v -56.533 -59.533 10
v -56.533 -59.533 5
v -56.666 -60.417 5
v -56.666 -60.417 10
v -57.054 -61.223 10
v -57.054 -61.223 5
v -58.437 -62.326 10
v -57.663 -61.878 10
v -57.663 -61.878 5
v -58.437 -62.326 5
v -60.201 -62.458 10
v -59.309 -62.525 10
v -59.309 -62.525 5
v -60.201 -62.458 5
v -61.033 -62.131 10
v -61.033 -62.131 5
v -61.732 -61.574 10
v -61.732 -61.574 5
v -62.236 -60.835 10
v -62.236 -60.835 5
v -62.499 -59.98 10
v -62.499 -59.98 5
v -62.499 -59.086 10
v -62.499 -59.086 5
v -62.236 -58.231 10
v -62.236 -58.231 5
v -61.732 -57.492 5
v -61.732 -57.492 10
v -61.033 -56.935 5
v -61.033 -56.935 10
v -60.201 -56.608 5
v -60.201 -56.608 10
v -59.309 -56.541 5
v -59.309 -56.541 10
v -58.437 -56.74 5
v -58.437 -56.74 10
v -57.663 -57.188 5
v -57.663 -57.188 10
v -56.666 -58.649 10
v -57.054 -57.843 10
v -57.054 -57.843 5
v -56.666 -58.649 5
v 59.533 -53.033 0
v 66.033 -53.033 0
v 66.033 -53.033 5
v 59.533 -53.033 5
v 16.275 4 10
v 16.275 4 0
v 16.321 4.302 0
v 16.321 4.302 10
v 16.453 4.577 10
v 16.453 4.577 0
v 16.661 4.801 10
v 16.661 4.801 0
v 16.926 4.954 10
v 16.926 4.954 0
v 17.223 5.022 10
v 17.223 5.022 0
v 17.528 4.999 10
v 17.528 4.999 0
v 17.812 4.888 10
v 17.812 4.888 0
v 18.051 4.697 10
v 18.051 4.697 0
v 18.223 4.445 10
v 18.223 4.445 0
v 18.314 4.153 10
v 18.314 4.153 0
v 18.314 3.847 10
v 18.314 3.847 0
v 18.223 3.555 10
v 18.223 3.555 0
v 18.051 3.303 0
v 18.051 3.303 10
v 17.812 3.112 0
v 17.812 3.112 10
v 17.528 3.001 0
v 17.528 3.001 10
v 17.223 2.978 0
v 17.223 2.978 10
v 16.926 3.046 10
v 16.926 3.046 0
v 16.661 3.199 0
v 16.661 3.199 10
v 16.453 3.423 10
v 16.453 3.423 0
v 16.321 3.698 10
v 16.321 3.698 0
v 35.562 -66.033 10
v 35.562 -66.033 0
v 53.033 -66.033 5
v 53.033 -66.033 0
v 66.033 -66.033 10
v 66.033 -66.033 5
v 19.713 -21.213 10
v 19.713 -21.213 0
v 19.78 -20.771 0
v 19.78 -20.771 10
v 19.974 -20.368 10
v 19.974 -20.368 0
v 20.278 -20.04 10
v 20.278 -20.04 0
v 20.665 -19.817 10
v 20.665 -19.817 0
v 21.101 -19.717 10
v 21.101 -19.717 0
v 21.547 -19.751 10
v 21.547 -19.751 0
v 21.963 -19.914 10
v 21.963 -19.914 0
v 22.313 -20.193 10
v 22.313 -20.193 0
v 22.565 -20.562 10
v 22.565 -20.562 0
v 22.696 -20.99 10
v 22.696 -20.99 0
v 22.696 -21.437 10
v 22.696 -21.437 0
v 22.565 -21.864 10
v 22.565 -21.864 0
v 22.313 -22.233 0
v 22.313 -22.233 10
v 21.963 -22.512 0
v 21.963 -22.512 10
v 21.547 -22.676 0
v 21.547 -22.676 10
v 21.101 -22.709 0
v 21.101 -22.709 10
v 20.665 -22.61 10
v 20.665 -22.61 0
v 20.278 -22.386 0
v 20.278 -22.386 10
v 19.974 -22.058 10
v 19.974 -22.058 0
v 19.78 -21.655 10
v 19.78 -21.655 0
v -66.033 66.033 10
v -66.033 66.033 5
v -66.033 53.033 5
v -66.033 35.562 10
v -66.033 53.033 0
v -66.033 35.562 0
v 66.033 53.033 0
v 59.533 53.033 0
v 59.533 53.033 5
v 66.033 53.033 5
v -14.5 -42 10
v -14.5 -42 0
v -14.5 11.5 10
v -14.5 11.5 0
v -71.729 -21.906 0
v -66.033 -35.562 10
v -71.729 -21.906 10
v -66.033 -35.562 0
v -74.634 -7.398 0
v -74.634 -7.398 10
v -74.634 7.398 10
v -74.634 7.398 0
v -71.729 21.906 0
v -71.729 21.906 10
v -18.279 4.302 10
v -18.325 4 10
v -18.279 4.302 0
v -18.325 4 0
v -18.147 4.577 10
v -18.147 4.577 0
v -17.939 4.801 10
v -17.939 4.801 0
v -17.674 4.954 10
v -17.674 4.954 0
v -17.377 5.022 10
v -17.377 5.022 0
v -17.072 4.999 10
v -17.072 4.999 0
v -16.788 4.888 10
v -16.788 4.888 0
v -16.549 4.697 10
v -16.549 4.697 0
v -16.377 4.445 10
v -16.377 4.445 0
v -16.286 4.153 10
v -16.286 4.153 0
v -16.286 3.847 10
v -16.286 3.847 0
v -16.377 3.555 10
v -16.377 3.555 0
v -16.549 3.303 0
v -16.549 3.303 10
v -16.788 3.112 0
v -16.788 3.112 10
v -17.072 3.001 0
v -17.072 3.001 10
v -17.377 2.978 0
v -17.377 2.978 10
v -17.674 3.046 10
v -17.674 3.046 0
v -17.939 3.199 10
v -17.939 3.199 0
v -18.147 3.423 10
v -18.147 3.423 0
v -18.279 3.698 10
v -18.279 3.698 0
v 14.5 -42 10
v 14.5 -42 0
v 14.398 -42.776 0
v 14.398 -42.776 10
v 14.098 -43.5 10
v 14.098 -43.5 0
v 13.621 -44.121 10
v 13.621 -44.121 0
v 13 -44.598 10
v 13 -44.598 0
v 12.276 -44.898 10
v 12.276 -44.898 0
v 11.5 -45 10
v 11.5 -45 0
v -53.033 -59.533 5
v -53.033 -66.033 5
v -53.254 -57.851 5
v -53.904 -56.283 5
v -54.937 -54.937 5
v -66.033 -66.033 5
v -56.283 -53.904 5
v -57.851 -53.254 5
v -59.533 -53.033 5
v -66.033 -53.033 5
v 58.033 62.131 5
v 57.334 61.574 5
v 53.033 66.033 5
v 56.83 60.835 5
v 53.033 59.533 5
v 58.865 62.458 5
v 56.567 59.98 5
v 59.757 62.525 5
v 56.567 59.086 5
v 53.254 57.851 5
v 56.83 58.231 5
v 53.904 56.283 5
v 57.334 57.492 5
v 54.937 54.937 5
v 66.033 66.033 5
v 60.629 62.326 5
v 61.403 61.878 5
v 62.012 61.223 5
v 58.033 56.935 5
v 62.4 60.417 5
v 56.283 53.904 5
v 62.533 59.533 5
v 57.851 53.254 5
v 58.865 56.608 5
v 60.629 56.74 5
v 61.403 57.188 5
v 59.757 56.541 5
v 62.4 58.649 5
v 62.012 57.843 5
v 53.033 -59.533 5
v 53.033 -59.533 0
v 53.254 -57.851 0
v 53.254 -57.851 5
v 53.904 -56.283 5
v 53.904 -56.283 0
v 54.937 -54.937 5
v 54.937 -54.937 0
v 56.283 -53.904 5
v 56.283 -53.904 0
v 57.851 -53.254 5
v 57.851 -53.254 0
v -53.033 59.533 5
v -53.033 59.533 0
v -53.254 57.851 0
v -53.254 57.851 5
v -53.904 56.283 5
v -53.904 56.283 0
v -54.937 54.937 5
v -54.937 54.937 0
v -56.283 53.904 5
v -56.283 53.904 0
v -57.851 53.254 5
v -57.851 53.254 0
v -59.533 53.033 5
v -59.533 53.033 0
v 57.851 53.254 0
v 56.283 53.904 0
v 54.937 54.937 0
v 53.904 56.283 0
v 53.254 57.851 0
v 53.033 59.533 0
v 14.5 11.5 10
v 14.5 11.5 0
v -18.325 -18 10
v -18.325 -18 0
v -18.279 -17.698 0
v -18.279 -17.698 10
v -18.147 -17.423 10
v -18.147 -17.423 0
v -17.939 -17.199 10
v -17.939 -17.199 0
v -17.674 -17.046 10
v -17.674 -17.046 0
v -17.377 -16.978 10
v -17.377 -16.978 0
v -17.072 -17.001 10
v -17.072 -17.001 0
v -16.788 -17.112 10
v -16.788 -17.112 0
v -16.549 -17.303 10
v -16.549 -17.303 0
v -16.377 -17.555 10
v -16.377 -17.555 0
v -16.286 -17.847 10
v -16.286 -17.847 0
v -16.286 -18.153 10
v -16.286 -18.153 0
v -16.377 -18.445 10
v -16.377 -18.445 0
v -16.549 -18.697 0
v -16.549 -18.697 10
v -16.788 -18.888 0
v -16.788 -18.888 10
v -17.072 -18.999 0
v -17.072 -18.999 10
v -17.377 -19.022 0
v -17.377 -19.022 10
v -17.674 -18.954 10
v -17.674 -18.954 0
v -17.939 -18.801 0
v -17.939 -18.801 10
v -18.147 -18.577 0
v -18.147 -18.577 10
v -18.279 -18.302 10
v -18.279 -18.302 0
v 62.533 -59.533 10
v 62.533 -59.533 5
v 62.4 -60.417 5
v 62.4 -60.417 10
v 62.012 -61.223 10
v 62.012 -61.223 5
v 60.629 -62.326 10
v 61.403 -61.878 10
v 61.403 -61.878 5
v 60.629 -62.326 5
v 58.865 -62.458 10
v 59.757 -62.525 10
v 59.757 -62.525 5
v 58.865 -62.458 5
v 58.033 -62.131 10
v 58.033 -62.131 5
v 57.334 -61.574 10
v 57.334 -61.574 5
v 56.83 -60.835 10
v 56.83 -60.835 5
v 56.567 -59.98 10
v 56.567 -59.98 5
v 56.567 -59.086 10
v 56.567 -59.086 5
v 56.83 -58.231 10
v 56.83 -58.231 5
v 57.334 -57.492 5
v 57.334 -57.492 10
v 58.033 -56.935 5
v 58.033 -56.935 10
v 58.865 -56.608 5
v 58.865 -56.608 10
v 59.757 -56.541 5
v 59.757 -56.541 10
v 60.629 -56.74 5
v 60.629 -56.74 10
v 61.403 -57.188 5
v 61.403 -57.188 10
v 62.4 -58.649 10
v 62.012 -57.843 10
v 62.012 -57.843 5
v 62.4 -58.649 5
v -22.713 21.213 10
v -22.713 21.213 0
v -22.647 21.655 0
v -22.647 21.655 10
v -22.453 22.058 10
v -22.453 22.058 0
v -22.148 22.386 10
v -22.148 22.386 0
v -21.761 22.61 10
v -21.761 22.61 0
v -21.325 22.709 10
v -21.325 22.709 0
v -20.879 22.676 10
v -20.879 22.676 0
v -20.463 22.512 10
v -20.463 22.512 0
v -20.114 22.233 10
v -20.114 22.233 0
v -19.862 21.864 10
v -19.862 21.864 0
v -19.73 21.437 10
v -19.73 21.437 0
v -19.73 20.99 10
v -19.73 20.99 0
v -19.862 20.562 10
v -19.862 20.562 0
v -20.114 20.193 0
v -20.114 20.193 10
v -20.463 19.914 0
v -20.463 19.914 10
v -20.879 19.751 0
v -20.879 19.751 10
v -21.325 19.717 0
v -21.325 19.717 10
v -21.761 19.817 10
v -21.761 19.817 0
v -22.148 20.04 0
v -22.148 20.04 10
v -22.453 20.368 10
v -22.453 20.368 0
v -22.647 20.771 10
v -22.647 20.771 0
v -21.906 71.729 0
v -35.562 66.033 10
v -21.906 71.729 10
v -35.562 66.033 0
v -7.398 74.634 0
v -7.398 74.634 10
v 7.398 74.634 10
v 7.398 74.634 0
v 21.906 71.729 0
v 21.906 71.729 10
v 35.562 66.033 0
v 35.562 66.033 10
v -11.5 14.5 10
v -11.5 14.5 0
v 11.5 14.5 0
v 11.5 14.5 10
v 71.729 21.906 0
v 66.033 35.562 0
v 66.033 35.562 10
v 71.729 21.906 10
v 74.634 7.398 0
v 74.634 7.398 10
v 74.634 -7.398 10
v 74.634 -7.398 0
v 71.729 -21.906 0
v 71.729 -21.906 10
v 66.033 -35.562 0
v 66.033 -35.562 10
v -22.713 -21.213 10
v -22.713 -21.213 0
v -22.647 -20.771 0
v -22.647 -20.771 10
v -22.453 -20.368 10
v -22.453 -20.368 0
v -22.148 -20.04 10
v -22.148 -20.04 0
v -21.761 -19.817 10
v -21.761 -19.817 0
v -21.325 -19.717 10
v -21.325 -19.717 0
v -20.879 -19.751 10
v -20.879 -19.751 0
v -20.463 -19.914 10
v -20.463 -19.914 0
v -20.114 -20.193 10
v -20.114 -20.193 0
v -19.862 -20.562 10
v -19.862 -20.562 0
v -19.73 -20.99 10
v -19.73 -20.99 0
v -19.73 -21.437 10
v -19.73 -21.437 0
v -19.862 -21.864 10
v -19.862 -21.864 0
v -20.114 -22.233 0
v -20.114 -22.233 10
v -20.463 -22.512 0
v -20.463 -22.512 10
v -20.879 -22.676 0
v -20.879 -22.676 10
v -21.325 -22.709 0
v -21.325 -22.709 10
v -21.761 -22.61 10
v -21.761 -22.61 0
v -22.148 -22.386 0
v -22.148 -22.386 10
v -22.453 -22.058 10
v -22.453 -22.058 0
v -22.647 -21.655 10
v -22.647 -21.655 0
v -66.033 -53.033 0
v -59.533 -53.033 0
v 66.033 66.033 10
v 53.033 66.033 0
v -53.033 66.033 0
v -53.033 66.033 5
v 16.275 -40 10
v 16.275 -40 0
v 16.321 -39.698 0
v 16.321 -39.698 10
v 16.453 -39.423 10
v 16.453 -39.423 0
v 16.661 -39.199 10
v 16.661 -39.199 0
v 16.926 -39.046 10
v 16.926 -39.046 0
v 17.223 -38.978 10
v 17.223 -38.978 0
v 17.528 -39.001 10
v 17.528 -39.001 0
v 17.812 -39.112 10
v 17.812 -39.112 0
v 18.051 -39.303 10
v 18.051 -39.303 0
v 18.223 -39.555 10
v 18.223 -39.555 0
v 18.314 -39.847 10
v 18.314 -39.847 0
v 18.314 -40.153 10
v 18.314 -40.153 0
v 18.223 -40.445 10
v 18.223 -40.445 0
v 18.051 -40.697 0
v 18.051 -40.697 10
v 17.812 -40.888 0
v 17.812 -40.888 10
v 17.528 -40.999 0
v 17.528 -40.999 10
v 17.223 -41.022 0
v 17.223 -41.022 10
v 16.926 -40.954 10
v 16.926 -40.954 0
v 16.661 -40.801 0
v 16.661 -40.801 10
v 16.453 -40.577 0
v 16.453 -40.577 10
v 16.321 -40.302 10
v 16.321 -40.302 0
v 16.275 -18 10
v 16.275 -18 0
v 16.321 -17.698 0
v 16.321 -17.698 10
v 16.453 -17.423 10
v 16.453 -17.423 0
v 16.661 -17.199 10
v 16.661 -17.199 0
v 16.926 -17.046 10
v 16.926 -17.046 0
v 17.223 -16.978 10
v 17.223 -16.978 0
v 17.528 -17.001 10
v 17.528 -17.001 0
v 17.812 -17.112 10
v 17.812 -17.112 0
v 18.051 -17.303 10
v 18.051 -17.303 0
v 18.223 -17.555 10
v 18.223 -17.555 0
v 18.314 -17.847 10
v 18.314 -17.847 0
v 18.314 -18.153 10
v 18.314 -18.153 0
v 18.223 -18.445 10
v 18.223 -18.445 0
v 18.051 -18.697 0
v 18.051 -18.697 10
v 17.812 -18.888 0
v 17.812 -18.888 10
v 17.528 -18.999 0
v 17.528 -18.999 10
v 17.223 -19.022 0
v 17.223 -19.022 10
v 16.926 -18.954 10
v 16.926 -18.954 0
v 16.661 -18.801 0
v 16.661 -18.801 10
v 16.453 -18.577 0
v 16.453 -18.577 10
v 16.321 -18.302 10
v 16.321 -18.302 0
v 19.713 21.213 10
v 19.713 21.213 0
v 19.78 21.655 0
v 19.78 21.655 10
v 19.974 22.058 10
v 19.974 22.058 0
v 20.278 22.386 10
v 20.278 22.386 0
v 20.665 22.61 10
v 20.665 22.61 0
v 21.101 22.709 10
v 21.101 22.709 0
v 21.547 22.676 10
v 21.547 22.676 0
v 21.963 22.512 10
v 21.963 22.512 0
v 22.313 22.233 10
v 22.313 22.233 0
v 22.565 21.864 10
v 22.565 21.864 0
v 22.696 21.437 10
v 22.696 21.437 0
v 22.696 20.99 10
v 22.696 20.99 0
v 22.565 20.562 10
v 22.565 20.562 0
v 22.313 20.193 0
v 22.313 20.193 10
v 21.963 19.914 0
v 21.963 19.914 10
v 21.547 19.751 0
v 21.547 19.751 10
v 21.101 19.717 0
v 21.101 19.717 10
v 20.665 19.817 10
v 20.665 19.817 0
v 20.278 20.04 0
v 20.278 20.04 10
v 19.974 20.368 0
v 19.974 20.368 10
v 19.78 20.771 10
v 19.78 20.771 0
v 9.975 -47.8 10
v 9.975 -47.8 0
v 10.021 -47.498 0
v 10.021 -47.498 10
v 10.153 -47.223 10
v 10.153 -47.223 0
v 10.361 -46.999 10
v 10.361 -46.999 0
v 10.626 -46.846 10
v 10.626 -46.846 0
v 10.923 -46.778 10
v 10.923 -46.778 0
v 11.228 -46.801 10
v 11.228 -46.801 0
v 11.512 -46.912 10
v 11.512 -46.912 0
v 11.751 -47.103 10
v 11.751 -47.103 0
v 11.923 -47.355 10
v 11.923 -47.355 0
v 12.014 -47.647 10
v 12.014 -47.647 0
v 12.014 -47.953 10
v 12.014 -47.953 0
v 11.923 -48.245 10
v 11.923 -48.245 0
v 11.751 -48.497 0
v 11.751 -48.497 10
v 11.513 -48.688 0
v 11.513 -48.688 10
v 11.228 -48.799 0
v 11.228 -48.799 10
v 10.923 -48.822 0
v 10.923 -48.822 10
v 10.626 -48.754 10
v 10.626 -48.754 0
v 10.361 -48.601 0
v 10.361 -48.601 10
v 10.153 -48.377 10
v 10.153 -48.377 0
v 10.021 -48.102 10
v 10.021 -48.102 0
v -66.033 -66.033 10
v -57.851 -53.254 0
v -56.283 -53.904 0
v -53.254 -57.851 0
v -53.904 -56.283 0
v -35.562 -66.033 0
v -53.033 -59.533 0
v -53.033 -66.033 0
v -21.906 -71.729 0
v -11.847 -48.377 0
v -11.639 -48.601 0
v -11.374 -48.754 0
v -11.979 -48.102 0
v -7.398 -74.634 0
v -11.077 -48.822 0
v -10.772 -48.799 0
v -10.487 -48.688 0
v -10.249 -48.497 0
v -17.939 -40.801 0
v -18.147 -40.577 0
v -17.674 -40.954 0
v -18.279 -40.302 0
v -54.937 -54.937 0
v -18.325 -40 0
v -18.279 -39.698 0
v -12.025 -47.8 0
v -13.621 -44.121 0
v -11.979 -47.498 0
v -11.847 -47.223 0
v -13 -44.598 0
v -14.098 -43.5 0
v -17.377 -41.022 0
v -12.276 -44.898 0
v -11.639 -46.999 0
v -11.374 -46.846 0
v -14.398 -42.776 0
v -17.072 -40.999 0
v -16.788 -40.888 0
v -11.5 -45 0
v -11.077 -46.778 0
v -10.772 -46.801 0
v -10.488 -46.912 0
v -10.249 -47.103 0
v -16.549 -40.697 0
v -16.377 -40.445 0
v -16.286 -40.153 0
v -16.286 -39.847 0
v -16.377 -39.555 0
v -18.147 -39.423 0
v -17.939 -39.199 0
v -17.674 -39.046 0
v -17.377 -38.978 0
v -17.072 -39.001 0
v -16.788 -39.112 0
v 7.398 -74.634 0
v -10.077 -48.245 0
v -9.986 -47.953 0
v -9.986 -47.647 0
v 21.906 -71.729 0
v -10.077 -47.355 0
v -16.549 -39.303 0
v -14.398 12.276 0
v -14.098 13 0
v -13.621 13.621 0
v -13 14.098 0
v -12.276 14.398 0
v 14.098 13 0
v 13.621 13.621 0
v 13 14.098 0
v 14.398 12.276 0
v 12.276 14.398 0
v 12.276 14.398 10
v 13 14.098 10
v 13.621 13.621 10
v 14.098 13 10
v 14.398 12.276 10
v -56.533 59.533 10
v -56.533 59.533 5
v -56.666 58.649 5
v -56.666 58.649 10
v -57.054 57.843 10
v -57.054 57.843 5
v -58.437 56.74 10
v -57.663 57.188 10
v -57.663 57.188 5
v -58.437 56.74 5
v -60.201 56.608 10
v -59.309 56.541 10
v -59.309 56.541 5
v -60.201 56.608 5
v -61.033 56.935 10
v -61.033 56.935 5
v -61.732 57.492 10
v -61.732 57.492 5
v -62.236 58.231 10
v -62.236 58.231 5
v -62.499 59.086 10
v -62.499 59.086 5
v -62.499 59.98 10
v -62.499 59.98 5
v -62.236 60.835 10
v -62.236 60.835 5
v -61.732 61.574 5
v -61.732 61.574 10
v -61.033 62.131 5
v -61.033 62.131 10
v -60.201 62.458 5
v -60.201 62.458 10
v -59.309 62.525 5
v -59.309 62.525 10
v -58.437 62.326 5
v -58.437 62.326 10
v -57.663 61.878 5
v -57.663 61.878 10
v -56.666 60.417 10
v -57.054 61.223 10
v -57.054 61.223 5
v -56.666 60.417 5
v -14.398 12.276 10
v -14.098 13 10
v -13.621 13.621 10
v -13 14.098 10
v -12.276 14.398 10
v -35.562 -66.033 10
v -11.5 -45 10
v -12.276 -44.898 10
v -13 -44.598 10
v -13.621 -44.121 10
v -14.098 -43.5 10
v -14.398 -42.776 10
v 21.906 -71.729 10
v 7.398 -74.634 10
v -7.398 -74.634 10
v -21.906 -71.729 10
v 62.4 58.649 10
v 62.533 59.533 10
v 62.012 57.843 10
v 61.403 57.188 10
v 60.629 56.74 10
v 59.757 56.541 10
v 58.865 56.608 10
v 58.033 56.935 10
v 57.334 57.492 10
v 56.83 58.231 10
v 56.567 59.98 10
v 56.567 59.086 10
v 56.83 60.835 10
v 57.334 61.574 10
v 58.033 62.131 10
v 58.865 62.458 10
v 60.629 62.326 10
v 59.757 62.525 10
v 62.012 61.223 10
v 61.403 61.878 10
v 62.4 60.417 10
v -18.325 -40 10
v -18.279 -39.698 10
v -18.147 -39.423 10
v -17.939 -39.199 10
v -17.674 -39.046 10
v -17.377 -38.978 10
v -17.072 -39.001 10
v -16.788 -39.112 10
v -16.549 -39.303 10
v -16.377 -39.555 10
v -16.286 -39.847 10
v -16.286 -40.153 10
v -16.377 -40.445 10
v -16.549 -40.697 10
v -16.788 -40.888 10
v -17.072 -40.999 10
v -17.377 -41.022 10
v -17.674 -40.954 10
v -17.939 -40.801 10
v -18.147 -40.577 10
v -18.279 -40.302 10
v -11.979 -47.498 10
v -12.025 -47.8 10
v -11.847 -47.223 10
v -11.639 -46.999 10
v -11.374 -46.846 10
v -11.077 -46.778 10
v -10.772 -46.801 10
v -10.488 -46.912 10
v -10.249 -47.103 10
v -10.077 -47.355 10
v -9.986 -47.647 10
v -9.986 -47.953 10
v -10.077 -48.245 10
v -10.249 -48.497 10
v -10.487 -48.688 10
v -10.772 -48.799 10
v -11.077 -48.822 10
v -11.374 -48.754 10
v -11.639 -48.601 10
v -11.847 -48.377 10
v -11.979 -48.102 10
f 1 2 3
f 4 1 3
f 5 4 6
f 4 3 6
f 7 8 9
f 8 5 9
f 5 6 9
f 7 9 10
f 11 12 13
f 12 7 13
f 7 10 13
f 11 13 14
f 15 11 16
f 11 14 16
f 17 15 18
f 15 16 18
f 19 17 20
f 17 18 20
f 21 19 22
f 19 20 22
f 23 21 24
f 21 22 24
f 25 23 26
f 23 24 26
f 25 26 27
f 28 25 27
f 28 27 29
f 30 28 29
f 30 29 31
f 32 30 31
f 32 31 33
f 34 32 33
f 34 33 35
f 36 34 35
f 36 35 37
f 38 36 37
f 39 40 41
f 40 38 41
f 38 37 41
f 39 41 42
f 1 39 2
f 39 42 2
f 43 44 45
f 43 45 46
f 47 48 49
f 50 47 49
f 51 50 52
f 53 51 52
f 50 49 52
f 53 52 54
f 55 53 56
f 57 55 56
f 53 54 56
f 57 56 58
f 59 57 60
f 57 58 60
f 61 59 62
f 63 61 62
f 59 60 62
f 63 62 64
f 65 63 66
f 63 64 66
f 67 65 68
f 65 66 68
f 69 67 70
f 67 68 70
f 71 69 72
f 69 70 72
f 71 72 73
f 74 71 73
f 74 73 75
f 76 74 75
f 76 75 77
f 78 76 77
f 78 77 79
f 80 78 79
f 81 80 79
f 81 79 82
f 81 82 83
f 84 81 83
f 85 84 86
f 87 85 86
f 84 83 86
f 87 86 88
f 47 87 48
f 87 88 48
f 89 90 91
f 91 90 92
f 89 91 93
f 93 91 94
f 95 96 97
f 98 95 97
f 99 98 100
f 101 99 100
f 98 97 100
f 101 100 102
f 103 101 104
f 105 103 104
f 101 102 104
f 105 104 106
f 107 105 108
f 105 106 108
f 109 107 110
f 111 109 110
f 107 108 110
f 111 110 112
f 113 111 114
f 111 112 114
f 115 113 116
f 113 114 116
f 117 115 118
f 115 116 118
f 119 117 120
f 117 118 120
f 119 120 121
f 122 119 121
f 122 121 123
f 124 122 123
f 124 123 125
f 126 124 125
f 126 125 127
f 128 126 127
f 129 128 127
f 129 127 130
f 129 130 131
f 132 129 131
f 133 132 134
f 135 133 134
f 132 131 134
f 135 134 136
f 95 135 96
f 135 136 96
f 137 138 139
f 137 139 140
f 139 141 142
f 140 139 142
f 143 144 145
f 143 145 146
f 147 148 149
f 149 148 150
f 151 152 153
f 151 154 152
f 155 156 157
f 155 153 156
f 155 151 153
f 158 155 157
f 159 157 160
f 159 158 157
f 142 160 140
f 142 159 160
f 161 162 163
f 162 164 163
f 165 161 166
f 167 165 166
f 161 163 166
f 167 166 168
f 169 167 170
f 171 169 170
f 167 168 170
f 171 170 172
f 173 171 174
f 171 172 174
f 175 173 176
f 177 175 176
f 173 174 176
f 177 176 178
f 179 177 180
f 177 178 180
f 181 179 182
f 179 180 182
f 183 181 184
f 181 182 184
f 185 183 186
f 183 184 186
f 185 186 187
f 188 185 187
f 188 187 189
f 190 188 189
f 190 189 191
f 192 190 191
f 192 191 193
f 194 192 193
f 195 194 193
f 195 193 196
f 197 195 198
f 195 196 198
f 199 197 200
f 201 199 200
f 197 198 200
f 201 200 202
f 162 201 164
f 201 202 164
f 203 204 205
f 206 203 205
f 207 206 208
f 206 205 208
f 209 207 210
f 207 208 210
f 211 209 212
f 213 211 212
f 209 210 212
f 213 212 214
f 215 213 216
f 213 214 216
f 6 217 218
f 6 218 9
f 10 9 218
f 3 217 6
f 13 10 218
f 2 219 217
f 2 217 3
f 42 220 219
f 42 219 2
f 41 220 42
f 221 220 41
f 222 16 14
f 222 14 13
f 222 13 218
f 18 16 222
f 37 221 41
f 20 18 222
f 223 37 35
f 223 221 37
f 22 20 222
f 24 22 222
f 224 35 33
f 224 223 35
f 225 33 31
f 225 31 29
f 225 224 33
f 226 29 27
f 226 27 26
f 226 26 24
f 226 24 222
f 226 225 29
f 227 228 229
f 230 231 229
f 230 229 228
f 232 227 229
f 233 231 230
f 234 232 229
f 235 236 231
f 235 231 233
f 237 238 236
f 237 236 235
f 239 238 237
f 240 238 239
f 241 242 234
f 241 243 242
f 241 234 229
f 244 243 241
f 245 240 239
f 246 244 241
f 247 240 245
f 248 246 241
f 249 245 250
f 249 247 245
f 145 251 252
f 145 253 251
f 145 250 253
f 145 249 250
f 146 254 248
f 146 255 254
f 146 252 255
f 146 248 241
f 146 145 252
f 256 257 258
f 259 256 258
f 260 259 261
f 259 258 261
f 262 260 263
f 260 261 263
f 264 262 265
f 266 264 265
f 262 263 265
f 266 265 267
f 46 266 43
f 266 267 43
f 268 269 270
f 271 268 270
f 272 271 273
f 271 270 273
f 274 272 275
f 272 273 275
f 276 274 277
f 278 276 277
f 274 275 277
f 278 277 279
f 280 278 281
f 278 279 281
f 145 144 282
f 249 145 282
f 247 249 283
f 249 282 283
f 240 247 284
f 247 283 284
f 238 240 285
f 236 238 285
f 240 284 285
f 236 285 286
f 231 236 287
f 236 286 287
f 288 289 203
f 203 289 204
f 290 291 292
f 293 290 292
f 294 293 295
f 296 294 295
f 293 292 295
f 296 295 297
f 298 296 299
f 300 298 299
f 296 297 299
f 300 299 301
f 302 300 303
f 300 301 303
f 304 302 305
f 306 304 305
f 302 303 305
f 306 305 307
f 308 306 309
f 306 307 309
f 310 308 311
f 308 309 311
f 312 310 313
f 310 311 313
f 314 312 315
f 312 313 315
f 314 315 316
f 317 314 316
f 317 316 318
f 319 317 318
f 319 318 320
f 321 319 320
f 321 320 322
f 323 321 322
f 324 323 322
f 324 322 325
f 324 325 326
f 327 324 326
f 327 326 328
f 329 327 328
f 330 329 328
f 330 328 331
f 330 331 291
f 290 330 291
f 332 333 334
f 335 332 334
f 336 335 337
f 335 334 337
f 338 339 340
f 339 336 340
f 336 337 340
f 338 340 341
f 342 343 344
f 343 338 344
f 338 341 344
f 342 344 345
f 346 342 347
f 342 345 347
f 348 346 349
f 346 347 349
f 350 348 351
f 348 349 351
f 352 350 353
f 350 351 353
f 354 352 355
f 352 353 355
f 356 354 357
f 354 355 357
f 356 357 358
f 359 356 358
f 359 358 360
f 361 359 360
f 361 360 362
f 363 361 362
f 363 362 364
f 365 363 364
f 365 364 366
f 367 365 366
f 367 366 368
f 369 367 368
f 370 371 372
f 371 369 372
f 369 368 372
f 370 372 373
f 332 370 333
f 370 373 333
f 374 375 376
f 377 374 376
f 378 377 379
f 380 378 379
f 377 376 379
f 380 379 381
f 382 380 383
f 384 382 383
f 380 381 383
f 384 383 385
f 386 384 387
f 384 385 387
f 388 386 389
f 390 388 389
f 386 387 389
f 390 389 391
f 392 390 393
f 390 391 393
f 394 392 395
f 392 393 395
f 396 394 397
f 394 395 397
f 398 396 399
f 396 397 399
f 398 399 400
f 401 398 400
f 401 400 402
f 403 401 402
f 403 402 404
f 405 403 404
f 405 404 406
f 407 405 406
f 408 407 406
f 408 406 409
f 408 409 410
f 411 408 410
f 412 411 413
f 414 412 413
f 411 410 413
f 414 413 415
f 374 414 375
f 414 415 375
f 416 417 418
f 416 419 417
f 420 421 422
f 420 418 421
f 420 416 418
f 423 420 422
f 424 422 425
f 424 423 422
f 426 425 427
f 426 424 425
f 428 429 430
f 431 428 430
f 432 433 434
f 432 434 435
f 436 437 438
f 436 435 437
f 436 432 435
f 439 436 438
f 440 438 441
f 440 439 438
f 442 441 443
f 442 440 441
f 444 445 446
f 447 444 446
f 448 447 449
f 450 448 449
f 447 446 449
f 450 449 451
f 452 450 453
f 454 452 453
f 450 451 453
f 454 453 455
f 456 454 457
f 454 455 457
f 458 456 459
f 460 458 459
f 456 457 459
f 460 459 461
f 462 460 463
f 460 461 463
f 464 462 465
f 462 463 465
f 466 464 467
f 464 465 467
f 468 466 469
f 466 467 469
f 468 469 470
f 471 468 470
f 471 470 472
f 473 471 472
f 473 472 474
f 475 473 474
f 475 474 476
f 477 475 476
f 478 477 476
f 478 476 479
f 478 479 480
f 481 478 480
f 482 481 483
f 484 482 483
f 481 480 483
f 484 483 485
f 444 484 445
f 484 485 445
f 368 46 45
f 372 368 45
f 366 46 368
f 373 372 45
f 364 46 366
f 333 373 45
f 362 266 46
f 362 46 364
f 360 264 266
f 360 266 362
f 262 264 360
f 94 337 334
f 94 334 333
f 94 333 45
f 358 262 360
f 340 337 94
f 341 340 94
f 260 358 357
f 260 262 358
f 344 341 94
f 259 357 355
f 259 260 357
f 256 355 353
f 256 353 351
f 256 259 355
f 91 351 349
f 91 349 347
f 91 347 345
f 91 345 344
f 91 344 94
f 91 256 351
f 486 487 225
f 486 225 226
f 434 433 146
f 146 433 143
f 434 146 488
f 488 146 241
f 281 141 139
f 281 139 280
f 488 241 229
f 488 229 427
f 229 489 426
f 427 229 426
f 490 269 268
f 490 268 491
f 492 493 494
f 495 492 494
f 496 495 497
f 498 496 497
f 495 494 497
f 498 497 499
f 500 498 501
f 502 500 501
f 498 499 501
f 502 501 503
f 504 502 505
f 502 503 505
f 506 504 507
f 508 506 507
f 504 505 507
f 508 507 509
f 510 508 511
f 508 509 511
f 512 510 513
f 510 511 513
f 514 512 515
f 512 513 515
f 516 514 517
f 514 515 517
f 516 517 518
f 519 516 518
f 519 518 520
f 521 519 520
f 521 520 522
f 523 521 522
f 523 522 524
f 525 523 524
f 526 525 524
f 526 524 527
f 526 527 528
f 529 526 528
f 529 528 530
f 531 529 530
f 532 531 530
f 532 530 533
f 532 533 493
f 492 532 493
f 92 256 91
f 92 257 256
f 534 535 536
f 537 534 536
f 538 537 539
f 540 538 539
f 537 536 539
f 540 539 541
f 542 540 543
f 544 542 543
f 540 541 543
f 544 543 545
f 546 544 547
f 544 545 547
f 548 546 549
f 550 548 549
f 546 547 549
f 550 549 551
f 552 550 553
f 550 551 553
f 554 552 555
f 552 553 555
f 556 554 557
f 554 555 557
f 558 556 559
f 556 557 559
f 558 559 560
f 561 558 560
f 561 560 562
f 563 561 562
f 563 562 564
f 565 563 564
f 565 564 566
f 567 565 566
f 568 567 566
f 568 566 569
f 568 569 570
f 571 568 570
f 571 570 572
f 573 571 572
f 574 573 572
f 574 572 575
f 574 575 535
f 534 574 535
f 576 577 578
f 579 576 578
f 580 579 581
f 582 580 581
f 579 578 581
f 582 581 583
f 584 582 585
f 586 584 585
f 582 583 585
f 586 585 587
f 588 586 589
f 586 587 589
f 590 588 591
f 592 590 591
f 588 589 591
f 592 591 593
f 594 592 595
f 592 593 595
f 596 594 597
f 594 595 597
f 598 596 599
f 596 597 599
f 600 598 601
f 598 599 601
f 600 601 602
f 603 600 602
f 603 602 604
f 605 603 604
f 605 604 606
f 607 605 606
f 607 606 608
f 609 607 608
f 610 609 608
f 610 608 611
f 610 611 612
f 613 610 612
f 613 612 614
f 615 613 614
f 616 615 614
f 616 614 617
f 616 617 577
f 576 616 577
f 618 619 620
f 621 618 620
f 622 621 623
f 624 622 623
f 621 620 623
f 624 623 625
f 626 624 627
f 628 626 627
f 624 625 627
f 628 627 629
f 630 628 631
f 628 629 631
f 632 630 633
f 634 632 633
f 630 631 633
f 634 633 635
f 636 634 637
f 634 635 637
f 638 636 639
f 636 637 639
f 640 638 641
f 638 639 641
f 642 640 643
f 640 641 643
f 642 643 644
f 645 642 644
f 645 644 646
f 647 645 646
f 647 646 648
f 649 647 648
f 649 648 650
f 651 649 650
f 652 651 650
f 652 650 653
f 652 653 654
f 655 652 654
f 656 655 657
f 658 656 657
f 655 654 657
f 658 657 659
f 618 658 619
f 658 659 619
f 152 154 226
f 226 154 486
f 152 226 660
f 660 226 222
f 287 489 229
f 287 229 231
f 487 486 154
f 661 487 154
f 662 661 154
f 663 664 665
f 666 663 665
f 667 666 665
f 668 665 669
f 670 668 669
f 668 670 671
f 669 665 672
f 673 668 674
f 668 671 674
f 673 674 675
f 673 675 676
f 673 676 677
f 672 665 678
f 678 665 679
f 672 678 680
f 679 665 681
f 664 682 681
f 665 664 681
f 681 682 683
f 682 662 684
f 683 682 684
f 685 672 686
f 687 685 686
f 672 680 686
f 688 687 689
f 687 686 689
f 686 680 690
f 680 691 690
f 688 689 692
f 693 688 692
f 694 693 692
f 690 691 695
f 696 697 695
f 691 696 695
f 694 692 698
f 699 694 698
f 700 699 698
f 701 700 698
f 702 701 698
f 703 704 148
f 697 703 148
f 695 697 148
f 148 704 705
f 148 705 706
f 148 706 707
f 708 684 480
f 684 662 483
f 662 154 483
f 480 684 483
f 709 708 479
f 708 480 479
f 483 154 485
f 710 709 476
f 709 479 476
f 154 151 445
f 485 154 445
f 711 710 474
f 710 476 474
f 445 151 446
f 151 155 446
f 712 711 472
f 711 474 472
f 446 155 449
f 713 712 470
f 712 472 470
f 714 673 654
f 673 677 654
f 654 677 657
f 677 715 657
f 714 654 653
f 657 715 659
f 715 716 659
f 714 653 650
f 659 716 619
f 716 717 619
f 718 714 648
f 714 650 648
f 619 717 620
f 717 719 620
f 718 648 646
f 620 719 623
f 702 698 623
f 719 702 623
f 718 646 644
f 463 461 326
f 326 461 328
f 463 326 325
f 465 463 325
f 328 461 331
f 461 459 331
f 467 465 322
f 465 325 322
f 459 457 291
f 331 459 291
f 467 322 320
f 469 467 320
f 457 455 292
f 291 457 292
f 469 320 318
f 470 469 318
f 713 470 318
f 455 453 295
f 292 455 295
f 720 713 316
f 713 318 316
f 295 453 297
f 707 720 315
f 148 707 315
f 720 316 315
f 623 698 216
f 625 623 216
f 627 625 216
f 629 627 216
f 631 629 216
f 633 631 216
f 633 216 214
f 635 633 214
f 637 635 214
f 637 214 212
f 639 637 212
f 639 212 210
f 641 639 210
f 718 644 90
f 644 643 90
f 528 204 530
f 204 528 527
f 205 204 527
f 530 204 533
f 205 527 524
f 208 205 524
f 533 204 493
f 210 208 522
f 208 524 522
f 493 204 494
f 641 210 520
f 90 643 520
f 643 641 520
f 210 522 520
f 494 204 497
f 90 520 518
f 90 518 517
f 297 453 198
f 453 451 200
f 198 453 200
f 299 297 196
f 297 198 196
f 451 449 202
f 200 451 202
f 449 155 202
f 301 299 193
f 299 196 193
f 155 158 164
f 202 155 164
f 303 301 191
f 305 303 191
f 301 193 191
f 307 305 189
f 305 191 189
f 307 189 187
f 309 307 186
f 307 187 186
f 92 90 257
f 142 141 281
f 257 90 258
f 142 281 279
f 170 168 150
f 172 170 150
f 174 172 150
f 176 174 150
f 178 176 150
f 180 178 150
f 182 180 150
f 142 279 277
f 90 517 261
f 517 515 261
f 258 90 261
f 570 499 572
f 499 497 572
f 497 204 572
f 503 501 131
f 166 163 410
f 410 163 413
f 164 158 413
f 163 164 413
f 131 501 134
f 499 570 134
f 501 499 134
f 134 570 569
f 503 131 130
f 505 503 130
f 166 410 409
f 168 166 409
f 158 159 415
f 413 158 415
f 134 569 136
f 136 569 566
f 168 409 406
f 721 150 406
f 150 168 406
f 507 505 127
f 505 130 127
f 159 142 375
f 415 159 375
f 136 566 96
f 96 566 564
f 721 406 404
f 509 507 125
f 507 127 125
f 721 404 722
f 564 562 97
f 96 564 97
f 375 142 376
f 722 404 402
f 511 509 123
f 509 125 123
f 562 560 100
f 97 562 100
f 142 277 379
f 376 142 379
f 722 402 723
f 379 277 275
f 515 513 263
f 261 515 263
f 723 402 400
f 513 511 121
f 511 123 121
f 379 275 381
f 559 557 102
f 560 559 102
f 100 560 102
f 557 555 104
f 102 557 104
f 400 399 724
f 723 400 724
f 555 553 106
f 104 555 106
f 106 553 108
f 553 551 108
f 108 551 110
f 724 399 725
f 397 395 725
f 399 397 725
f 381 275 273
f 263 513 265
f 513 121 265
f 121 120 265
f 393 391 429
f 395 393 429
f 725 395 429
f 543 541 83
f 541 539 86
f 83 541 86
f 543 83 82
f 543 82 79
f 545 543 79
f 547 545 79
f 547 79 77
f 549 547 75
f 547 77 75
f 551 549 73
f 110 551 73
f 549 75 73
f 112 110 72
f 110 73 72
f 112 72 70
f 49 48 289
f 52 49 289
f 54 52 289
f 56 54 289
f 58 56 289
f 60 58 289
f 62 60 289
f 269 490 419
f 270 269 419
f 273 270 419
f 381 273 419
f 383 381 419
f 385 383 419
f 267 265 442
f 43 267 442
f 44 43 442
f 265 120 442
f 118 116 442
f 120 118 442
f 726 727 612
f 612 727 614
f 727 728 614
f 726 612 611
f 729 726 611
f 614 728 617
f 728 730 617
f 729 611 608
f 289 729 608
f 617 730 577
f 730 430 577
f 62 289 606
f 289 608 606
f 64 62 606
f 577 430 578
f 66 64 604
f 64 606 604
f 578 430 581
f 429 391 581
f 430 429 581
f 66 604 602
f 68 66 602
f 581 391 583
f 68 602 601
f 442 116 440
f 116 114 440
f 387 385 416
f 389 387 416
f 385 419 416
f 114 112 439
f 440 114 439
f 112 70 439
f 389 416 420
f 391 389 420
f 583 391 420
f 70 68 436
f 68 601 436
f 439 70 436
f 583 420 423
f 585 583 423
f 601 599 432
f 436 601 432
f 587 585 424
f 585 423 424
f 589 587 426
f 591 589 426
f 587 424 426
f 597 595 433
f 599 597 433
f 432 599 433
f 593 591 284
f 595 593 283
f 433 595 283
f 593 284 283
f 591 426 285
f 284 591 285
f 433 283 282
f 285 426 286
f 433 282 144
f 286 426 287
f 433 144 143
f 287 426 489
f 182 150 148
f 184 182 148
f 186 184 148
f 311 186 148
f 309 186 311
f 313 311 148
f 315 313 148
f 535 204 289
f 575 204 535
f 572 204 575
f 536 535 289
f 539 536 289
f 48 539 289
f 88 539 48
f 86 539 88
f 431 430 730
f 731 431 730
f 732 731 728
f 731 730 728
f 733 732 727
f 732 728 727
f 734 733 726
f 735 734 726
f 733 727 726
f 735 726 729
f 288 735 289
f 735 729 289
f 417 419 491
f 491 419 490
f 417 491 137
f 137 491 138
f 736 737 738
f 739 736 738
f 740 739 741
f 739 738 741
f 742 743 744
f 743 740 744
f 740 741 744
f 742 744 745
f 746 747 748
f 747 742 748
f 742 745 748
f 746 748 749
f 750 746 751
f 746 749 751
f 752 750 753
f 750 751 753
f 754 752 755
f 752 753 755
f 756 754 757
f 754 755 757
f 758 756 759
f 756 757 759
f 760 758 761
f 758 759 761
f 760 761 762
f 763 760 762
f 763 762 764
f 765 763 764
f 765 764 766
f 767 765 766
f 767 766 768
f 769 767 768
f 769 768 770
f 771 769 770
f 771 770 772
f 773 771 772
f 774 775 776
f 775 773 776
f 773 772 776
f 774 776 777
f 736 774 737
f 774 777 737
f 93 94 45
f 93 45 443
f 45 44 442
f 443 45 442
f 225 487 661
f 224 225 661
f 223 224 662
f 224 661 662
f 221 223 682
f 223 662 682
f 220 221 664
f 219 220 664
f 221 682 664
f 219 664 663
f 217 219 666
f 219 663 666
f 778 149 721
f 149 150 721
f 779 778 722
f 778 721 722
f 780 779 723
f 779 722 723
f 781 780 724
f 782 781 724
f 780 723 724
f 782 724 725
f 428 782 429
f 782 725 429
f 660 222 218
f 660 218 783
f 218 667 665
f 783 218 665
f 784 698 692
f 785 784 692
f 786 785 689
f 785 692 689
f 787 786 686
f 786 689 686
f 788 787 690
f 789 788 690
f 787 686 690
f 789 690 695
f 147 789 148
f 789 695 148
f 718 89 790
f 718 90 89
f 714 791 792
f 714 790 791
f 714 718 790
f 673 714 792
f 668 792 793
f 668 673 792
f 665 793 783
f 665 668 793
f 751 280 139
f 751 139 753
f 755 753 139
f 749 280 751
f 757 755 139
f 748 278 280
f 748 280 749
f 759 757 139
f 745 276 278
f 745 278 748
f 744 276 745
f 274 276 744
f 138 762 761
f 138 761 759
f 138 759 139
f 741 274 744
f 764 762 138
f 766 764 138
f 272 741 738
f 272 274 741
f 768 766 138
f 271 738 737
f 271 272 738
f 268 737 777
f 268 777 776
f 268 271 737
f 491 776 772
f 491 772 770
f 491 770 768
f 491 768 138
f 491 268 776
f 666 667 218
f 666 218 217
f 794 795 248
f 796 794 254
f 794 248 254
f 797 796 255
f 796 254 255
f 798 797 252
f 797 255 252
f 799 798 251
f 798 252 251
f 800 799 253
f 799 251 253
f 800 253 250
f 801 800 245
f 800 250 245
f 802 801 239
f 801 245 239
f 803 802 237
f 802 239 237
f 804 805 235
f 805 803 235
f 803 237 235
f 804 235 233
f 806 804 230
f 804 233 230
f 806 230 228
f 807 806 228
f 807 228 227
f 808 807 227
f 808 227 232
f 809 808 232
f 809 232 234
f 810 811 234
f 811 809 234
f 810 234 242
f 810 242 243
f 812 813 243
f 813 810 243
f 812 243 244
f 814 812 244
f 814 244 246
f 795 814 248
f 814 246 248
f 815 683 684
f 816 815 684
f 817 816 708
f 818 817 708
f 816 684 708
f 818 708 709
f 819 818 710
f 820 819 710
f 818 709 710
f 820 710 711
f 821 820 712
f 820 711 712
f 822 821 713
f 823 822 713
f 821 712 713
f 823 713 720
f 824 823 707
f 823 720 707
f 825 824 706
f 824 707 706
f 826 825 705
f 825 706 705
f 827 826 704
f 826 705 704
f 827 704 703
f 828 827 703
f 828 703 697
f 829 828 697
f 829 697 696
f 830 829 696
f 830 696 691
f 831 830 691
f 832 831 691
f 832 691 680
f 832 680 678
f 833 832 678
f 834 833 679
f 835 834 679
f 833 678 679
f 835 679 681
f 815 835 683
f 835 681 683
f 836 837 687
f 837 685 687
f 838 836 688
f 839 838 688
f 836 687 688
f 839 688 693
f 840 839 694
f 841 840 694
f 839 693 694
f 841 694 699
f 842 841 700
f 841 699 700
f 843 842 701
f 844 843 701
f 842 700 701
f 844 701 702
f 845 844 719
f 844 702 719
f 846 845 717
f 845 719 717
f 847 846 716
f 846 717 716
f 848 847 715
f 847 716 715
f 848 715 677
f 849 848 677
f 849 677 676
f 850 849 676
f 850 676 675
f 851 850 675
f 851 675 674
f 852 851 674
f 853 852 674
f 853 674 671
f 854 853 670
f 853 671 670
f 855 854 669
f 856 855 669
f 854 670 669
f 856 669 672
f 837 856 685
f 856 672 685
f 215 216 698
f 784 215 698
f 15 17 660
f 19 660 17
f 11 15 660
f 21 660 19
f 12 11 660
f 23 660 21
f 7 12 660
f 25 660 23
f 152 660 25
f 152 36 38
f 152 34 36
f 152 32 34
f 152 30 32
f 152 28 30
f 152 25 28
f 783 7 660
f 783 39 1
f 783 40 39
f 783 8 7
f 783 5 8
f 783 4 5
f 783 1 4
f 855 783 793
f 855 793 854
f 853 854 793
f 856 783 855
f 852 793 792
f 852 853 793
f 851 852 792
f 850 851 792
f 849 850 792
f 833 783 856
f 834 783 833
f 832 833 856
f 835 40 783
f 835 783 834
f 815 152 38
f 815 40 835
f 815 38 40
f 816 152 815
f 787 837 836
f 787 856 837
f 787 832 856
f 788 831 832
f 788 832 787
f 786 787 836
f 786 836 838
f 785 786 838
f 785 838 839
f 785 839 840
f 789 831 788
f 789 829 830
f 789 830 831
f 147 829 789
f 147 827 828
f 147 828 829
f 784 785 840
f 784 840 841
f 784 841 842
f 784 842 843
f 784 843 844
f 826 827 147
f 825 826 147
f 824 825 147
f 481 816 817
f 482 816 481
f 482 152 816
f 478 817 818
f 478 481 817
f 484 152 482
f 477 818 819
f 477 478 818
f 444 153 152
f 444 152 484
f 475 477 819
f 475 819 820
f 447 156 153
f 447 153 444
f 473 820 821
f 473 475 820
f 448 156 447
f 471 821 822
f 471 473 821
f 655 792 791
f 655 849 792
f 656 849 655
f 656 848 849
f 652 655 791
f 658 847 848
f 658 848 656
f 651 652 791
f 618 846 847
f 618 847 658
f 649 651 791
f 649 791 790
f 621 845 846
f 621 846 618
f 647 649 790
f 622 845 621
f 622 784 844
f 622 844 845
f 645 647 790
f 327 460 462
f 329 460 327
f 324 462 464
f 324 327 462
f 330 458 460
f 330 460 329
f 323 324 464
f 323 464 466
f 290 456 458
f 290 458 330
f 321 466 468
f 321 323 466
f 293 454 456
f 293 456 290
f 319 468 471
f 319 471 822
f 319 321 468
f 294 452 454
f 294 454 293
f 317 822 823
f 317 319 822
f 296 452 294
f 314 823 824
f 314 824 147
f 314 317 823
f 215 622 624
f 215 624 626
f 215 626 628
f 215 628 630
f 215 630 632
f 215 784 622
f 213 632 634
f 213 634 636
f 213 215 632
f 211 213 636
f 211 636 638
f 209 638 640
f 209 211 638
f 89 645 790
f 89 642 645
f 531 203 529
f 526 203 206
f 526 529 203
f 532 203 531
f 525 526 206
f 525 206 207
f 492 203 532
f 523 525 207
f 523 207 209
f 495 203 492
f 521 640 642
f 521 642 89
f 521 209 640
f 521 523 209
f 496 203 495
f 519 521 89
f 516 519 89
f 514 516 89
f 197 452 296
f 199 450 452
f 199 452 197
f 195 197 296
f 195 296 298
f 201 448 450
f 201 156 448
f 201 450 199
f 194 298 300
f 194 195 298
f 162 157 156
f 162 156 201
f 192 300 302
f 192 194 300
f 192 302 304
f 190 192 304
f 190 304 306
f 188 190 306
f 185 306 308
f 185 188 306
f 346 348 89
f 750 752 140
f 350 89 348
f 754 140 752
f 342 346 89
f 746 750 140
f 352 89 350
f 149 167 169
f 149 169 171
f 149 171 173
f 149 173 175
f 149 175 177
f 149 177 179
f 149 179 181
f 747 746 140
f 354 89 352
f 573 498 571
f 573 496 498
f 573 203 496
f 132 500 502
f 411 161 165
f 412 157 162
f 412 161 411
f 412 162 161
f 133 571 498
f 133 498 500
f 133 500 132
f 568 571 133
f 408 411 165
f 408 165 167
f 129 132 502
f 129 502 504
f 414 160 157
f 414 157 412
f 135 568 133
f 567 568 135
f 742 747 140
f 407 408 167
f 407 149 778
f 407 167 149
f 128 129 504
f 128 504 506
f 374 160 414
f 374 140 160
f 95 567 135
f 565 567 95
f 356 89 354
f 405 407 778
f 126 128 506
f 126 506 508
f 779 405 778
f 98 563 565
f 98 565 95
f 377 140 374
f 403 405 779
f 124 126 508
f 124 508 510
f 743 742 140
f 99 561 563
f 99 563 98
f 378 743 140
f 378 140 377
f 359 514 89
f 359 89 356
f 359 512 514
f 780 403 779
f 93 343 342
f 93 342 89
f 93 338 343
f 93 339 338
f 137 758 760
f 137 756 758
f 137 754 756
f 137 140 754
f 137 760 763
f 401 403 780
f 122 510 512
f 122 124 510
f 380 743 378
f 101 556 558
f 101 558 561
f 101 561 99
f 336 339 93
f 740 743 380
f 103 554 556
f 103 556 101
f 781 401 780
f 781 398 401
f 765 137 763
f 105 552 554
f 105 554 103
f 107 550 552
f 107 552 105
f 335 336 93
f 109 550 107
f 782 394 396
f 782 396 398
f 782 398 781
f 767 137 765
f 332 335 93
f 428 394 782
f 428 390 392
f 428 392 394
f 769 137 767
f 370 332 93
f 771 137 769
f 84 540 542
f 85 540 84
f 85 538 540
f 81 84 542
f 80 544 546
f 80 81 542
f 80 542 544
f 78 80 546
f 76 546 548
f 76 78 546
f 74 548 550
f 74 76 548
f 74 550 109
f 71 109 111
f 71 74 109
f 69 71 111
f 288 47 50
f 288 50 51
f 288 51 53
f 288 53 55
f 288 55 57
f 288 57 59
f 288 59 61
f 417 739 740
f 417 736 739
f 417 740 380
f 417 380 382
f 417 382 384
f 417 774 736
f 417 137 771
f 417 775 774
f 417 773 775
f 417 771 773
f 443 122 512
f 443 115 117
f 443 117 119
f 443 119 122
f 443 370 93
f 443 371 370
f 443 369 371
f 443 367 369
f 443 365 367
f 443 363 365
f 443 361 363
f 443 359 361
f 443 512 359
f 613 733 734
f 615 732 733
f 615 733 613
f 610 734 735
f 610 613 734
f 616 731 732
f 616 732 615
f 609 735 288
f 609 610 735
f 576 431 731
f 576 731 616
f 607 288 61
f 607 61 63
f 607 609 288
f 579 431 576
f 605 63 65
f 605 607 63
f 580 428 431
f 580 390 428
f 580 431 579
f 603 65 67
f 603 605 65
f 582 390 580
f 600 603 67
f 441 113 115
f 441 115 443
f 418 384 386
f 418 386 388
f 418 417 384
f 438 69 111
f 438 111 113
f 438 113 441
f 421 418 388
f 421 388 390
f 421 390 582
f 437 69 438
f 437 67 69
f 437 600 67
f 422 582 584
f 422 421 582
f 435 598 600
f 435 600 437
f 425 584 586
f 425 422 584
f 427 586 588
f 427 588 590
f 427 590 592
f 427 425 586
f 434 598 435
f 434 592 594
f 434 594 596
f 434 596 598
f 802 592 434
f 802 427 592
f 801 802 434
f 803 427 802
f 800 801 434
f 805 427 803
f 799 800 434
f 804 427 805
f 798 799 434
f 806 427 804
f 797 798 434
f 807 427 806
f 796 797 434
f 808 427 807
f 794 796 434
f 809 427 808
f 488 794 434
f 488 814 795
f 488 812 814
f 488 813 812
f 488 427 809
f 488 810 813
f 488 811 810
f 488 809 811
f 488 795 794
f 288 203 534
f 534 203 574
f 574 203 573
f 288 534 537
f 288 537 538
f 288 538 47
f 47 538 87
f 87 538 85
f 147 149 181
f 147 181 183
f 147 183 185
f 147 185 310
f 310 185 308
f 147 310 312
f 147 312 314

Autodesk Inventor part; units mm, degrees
ref_plane "YZ Plane" through (0, 0, 0) normal (1, 0, 0) x (0, 1, 0)
ref_plane "XZ Plane" through (0, 0, 0) normal (0, 1, 0) x (-1, 0, 0)
ref_plane "XY Plane" through (0, 0, 0) normal (0, 0, 1) x (1, 0, 0)
sketch "Эскиз1" plane through (0, 0, 0) normal (0, 0, 1) x (1, 0, 0)
  circle A0 centre (59.533, -59.533) radius 3 projected
  circle A1 centre (-59.533, -59.533) radius 3 projected
  circle A2 centre (-59.533, 59.533) radius 3 projected
  circle A3 centre (59.533, 59.533) radius 3 projected
  circle A4 centre (0, 0) radius 65 projected
  arc A5 (35.5618, 66.033) -> (-35.5618, 66.033) centre (0, 0) ccw projected
  line L0 (-35.5618, 66.033) -> (-66.033, 66.033) projected
  line L1 (-66.033, 66.033) -> (-66.033, 35.5618) projected
  arc A6 (-66.033, 35.5618) -> (-66.033, -35.5618) centre (0, 0) ccw projected
  line L2 (-66.033, -35.5618) -> (-66.033, -66.033) projected
  line L3 (-66.033, -66.033) -> (-35.5618, -66.033) projected
  arc A7 (-35.5618, -66.033) -> (35.5618, -66.033) centre (0, 0) ccw projected
  line L4 (35.5618, -66.033) -> (66.033, -66.033) projected
  line L5 (66.033, -66.033) -> (66.033, -35.5618) projected
  arc A8 (66.033, -35.5618) -> (66.033, 35.5618) centre (0, 0) ccw projected
  line L6 (66.033, 35.5618) -> (66.033, 66.033) projected
  line L7 (66.033, 66.033) -> (35.5618, 66.033) projected
  point P0 (0, 0)
extrude "Выдавливание1" add sketch "Эскиз1" along normal blind 10 contours A4 | L7 L6 A8 L5 L4 A7 L3 L2 A6 L1 L0 A5
sketch "Эскиз8" plane through (0, 0, 0) normal (0, 0, -1) x (-1, 0, 0)
  arc A0 (-18, 26.5) -> (-26.5, 18) centre (-18, 18) ccw
  line L0 (-26.5, -18) -> (-26.5, 18)
  arc A1 (-26.5, -18) -> (-18, -26.5) centre (-18, -18) ccw
  line L1 (18, -26.5) -> (-18, -26.5)
  arc A2 (18, -26.5) -> (26.5, -18) centre (18, -18) ccw
  line L2 (26.5, 18) -> (26.5, -18)
  arc A3 (26.5, 18) -> (18, 26.5) centre (18, 18) ccw
  line L3 (-18, 26.5) -> (18, 26.5)
  circle A4 centre (-21.2132, 21.2132) radius 1.5
  circle A5 centre (-21.2132, -21.2132) radius 1.5
  circle A6 centre (21.2132, -21.2132) radius 1.5
  circle A7 centre (21.2132, 21.2132) radius 1.5
  circle A8 centre (0, 0) radius 22
extrude "Выдавливание6" cut sketch "Эскиз8" against normal blind 10 contours A4 | A5 | A6 | A7
sketch "Эскиз9" plane through (0, 0, 0) normal (0, 0, -1) x (-1, 0, 0)
  line L0 (20.1, -44.6) -> (20.1, 8.5)
  line L1 (20.1, 8.5) -> (15, 14.5)
  line L2 (11.5, 14.5) -> (15, 14.5)
  line L3 (11.5, 14.5) -> (-11.5, 14.5)
  line L4 (-15, 14.5) -> (-11.5, 14.5)
  line L5 (-15, 14.5) -> (-20.1, 8.5)
  line L6 (-20.1, 8.5) -> (-20.1, -44.6)
  line L7 (-20.1, -44.6) -> (-15, -50.6)
  line L8 (-15, -50.6) -> (15, -50.6)
  line L9 (15, -50.6) -> (20.1, -44.6)
  circle A0 centre (11, -47.8) radius 1.025
  circle A1 centre (-11, -47.8) radius 1.025
  circle A2 centre (-17.3, -40) radius 1.025
  circle A3 centre (17.3, -40) radius 1.025
  circle A4 centre (17.3, -18) radius 1.025
  circle A5 centre (17.3, 4) radius 1.025
  circle A6 centre (-17.3, 4) radius 1.025
  circle A7 centre (0, 0) radius 1.55
  circle A8 centre (0, 0) radius 14
  line L10 (-14.5, 11.5) -> (-14.5, -42)
  arc A9 (-11.5, 14.5) -> (-14.5, 11.5) centre (-11.5, 11.5) ccw
  arc A10 (-14.5, -42) -> (-11.5, -45) centre (-11.5, -42) ccw
  line L11 (-20.1, 8.5) -> (-20.1, -44.6)
  arc A11 (14.5, 11.5) -> (11.5, 14.5) centre (11.5, 11.5) ccw
  line L12 (14.5, -42) -> (14.5, 11.5)
  arc A12 (11.5, -45) -> (14.5, -42) centre (11.5, -42) ccw
  line L13 (-11.5, -45) -> (11.5, -45)
  circle A13 centre (-17.3, -18) radius 1.025
extrude "Выдавливание7" cut sketch "Эскиз9" against normal blind 20.75 contours A11 L12 A12 L13 A10 L10 A9 L3 | A0 | A1 | A2 | A3 | A4 | A5 | A6 | A7 | A8 | A13
sketch "Эскиз10" plane through (0, 0, 0) normal (0, 0, -1) x (-1, 0, 0)
  circle A0 centre (59.533, -59.533) radius 3 projected
  circle A1 centre (59.533, -59.533) radius 6.5
  line L0 (66.033, -66.033) -> (35.5618, -66.033) projected
  line L1 (66.033, -35.5618) -> (66.033, -66.033) projected
  line L2 (59.533, -53.033) -> (66.033, -53.033)
  line L3 (66.033, -53.033) -> (66.033, -66.033)
  line L4 (66.033, -66.033) -> (53.033, -66.033)
  line L5 (53.033, -66.033) -> (53.033, -59.533)
  point P0 (0, 0)
extrude "Выдавливание8" cut sketch "Эскиз10" against normal blind 5
pattern_circular "Круговой массив1" count 4 over 360 about axis through (0, 0, 0) along (0, 0, 1) of "Выдавливание8"
properties part number "000.202 - Крышка" material "Пластик АБС"
